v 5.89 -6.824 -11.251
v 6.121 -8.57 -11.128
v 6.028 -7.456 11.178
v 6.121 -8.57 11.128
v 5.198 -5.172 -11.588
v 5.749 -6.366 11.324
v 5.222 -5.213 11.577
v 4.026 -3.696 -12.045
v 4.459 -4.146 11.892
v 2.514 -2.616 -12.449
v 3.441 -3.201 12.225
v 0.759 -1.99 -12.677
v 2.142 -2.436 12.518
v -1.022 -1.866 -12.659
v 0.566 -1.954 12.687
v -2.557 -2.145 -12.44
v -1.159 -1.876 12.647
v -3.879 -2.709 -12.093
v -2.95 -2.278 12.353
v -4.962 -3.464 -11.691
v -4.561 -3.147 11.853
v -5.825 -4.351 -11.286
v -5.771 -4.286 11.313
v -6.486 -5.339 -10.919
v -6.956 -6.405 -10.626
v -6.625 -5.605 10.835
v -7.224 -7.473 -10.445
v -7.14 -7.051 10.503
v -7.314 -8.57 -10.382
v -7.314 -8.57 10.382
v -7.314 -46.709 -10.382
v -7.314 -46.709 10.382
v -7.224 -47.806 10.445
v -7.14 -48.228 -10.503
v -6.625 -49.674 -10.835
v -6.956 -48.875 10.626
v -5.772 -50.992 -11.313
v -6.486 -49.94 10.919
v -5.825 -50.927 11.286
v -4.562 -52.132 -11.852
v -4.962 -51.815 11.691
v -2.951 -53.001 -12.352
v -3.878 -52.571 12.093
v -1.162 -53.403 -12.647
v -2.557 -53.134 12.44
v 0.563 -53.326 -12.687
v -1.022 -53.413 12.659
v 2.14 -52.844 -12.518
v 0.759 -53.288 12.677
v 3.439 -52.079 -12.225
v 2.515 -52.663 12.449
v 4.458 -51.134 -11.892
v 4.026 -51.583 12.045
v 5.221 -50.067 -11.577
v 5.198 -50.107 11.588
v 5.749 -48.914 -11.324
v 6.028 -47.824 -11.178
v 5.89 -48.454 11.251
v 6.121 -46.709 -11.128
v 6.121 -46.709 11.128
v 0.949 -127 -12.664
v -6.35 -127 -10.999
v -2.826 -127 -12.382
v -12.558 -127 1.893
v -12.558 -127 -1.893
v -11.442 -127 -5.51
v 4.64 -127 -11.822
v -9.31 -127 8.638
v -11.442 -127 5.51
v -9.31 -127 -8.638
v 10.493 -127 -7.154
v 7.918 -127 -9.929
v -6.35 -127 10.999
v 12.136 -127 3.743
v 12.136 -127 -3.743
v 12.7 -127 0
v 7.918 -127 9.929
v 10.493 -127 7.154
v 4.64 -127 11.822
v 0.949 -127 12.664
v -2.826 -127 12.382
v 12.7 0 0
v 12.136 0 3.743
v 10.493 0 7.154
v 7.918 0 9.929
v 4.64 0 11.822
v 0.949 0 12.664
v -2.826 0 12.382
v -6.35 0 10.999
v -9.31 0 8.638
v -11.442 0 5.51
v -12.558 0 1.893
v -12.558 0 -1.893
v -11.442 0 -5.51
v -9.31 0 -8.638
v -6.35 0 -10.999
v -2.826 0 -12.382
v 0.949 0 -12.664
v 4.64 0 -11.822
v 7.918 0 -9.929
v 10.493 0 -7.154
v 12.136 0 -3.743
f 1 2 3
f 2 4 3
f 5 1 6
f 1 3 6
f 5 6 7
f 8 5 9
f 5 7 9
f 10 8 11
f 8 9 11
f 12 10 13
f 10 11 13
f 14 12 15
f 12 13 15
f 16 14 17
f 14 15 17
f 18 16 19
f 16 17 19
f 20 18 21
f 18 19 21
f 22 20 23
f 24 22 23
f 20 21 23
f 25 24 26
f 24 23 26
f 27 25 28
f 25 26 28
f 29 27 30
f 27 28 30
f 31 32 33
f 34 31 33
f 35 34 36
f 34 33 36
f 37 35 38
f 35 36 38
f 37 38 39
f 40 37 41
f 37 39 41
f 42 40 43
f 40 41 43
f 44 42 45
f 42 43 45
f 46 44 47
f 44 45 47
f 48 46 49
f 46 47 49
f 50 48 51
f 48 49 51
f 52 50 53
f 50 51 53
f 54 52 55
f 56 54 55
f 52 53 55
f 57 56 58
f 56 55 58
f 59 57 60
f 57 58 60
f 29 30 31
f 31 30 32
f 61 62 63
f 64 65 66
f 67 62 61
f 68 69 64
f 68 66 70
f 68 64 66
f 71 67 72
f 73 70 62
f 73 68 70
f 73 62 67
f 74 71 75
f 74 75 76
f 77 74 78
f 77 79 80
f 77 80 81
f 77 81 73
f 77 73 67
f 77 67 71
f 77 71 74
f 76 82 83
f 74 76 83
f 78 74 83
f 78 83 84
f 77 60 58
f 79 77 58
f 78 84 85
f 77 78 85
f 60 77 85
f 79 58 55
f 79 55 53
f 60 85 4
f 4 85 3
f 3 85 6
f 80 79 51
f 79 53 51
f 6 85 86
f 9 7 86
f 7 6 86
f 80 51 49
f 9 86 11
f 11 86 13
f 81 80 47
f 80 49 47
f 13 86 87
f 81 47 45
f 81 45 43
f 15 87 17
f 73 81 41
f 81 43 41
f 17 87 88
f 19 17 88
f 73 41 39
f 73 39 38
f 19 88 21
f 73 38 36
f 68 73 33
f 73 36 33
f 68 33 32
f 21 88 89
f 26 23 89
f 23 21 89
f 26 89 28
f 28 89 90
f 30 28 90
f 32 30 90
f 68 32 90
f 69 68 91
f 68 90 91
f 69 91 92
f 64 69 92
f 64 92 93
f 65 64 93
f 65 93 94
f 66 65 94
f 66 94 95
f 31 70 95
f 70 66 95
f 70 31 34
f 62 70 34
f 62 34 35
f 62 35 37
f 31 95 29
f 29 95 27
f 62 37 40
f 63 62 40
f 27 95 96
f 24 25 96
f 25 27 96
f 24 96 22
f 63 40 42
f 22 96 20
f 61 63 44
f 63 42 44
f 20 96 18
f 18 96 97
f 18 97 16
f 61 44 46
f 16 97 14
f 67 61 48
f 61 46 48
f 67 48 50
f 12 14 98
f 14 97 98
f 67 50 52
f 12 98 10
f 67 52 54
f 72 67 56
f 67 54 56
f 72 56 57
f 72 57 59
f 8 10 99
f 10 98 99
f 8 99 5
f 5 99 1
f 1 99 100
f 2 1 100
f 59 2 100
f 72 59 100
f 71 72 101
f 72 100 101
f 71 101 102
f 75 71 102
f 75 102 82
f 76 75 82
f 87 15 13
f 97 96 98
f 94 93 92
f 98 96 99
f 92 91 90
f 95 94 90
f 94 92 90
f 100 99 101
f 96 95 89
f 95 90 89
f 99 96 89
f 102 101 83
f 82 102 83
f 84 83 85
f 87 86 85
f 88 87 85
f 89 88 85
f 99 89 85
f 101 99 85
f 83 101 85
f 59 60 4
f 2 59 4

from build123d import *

# Parameters (mm, degrees)
F0_R     = 12.7
F1_DEPTH = 127
F3_DEPTH = 12.7


with BuildPart() as f1:
    # F0 (on Front) → F1 (new body)
    with BuildSketch(Plane.XZ):
        Circle(F0_R)
    extrude(amount=F1_DEPTH)

    # F2 (on Top) → F3 (cut, symmetric)
    with BuildSketch(Plane.XY):
        with BuildLine():
            ThreePointArc((6.120889, -8.56995), (-0.59676, -1.8523), (-7.31441, -8.56995))
            Line((-7.31441, -8.56995), (-7.31441, -46.708863))
            ThreePointArc((-7.31441, -46.708863), (-0.59676, -53.426513), (6.120889, -46.708863))
            Line((6.120889, -46.708863), (6.120889, -8.56995))
        make_face()
    extrude(amount=F3_DEPTH, both=True, mode=Mode.SUBTRACT)


solid = f1.part
